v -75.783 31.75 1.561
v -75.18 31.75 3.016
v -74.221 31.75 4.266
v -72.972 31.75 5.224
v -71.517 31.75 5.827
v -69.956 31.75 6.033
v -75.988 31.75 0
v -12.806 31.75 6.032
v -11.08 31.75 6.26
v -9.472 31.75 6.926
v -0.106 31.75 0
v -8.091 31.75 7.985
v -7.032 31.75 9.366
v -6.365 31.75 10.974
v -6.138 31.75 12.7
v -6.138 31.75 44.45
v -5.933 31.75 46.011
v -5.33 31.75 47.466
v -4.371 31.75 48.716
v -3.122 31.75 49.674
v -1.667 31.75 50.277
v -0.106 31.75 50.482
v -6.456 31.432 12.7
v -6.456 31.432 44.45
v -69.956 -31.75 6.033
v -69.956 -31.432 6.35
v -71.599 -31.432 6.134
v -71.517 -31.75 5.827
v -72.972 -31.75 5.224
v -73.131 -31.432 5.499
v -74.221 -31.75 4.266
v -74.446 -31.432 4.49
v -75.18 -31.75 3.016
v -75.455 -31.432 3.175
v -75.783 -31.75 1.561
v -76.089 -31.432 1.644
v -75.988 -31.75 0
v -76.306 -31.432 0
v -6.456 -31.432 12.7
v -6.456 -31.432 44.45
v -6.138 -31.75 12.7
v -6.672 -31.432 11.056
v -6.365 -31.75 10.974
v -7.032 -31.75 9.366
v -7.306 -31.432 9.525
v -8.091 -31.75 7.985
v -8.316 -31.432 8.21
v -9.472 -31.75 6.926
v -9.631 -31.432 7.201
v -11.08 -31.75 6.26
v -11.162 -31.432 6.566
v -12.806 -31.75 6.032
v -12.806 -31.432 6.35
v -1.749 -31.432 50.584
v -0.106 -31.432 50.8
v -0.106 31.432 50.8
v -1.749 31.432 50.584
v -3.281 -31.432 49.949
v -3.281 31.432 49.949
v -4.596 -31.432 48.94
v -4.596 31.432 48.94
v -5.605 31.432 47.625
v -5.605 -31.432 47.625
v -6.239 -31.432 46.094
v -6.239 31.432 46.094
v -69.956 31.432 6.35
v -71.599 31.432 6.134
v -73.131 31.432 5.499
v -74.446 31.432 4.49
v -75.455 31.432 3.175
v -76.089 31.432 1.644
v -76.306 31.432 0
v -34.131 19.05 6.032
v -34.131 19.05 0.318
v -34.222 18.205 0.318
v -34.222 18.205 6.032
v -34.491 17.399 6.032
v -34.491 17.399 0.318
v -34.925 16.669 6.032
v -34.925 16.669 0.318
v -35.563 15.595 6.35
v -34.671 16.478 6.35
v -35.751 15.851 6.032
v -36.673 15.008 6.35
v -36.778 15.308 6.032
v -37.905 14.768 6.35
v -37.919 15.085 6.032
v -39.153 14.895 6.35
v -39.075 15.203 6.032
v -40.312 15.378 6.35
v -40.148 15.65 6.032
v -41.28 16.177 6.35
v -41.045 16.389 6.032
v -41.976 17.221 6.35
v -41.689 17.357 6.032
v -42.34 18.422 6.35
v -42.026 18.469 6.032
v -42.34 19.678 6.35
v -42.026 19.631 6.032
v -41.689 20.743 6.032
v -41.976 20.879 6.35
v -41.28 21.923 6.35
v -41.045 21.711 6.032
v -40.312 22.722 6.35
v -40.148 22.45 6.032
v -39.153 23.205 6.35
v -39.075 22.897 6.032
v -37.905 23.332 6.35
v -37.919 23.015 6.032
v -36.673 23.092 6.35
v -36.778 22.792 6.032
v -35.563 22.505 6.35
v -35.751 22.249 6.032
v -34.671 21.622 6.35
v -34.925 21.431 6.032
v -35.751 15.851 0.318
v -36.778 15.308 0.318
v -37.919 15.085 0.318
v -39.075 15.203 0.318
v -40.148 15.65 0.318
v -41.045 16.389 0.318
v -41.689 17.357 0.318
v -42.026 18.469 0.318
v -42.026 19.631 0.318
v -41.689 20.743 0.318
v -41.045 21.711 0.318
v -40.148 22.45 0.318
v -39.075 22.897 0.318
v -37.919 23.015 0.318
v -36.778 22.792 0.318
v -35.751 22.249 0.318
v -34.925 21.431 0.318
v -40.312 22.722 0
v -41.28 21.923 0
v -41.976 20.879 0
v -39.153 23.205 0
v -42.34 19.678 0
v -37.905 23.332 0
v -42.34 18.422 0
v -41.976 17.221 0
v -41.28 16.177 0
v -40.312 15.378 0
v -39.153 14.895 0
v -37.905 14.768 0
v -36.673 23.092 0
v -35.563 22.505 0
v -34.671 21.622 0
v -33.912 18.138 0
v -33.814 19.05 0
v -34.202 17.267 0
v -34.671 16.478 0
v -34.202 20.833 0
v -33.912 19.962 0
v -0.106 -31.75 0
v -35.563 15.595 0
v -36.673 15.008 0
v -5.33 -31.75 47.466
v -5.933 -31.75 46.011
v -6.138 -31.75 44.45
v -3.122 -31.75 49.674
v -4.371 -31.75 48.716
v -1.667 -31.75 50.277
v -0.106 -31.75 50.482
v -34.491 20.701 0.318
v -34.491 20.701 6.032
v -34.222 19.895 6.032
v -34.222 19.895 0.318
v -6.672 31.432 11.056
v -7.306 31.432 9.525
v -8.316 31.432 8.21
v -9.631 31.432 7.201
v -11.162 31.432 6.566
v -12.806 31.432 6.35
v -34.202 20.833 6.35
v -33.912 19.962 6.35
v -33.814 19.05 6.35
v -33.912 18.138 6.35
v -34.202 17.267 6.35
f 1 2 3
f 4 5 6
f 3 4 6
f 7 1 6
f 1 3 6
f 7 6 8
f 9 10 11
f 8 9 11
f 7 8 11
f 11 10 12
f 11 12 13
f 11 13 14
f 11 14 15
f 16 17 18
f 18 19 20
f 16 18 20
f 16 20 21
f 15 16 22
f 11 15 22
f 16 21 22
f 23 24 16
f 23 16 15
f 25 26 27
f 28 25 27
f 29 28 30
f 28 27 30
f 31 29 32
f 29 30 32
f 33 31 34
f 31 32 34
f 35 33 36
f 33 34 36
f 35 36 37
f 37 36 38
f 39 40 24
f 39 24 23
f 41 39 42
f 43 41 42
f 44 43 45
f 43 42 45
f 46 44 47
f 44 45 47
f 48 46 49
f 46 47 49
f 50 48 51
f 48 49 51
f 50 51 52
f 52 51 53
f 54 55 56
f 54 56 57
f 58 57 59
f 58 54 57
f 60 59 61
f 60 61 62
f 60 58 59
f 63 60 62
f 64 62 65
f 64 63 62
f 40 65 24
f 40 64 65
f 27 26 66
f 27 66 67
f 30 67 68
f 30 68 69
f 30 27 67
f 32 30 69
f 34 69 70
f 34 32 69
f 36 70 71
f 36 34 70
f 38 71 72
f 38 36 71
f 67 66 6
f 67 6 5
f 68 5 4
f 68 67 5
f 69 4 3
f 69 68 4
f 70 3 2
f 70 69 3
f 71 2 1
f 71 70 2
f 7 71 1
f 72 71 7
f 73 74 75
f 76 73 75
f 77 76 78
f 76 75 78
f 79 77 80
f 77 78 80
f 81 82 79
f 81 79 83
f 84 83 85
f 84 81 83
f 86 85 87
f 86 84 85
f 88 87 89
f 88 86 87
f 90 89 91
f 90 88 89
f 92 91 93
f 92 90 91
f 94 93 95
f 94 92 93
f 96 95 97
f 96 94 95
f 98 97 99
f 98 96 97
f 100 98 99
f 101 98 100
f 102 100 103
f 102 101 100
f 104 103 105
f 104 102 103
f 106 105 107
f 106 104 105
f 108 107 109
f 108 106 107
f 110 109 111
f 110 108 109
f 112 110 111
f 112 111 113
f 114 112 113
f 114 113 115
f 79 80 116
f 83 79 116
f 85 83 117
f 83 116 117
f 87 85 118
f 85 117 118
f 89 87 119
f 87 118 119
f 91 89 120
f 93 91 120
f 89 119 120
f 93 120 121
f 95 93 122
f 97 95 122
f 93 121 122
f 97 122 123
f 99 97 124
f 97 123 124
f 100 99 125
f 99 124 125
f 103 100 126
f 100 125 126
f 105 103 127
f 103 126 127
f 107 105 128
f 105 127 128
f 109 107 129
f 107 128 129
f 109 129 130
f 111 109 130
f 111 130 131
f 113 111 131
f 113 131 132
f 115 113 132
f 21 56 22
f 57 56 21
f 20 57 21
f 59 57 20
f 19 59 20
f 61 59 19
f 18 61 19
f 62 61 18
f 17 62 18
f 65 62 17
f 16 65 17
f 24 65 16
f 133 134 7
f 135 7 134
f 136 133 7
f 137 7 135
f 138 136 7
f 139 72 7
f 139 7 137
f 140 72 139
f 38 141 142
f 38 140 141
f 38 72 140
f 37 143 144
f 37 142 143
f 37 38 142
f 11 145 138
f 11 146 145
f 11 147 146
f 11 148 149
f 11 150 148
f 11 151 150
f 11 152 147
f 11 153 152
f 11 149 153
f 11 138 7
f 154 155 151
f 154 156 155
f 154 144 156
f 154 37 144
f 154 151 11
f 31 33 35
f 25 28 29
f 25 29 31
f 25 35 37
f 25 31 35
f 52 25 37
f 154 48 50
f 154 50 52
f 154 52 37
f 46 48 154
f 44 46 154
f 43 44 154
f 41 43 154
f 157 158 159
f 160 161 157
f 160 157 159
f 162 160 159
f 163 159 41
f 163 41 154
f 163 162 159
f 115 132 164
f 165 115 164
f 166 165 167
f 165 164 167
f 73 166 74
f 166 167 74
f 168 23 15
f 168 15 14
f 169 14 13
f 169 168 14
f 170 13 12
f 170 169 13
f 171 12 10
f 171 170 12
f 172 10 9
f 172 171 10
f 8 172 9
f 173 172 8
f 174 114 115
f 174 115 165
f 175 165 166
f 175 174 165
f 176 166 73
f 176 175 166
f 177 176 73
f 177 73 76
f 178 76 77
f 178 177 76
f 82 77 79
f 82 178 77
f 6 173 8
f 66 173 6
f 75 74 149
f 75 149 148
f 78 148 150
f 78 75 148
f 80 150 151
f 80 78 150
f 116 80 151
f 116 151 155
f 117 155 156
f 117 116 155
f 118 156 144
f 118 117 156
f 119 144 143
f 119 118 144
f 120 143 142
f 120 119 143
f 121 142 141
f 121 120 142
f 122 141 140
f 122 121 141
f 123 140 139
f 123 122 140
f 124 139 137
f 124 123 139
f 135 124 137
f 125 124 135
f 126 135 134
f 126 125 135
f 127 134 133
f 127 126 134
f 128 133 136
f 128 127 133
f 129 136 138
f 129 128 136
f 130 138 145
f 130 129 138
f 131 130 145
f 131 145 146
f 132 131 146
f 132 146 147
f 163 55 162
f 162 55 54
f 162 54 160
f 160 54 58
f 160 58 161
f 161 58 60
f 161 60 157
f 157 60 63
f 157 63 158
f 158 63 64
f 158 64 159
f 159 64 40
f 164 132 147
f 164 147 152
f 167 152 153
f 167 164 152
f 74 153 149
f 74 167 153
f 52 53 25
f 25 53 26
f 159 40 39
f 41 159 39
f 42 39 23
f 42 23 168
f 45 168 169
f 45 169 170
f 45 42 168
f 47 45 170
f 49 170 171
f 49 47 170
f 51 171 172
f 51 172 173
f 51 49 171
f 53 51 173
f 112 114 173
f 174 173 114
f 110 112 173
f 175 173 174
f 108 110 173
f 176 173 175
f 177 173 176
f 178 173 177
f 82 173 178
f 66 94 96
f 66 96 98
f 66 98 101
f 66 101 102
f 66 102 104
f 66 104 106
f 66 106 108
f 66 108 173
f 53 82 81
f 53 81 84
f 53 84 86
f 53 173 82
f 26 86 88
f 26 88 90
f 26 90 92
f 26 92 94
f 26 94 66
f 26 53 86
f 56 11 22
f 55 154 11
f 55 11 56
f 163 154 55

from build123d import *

# Parameters (mm, degrees)
F1_DEPTH = 31.75
F3_DEPTH = 25.4
F4_SIZE  = 0.3175


with BuildPart() as f1:
    # F0 (on Front) → F1 (new body, symmetric)
    with BuildSketch(Plane.XZ):
        with BuildLine():
            Line((-76.3057246804, 0), (-0.1057246804, 0))
            Line((-0.1057246804, 0), (-0.1057246804, 50.8))
            ThreePointArc((-0.1057246804, 50.8), (-4.595852741, 48.9401280605), (-6.4557246804, 44.45))
            Line((-6.4557246804, 44.45), (-6.4557246804, 12.7))
            ThreePointArc((-6.4557246804, 12.7), (-8.3155966199, 8.2098719395), (-12.8057246804, 6.35))
            Line((-12.8057246804, 6.35), (-69.9557246804, 6.35))
            ThreePointArc((-69.9557246804, 6.35), (-74.445852741, 4.4901280605), (-76.3057246804, 0))
        make_face()
    extrude(amount=F1_DEPTH, both=True)

    # F2 (on face) → F3 (cut)
    with BuildSketch(Plane(origin=(0, 0, 0), x_dir=(1, 0, 0), z_dir=(0, 0, -1))):
        with BuildLine():
            ThreePointArc((-34.925, -16.66875), (-42.06875, -19.05), (-34.925, -21.43125))
            Line((-34.925, -21.43125), (-34.925, -19.05))
            Line((-34.925, -19.05), (-34.925, -16.66875))
        make_face()
        with BuildLine():
            Line((-34.925, -19.05), (-34.925, -21.43125))
            ThreePointArc((-34.925, -21.43125), (-34.3349131609, -20.3050289464), (-34.13125, -19.05))
            ThreePointArc((-34.13125, -19.05), (-34.3349131609, -17.7949710536), (-34.925, -16.66875))
            Line((-34.925, -16.66875), (-34.925, -19.05))
        make_face()
    extrude(amount=-F3_DEPTH, mode=Mode.SUBTRACT)

    # F4
    f4_edges = [f1.edges().sort_by_distance(p)[0] for p in [
        (-41.275, 16.66875, 6.35),
        (-41.380725, 31.75, 6.35),
        (-41.380725, -31.75, 6.35),
        (-41.275, 16.66875, 0),
    ]]
    chamfer(f4_edges, length=F4_SIZE)


solid = f1.part
